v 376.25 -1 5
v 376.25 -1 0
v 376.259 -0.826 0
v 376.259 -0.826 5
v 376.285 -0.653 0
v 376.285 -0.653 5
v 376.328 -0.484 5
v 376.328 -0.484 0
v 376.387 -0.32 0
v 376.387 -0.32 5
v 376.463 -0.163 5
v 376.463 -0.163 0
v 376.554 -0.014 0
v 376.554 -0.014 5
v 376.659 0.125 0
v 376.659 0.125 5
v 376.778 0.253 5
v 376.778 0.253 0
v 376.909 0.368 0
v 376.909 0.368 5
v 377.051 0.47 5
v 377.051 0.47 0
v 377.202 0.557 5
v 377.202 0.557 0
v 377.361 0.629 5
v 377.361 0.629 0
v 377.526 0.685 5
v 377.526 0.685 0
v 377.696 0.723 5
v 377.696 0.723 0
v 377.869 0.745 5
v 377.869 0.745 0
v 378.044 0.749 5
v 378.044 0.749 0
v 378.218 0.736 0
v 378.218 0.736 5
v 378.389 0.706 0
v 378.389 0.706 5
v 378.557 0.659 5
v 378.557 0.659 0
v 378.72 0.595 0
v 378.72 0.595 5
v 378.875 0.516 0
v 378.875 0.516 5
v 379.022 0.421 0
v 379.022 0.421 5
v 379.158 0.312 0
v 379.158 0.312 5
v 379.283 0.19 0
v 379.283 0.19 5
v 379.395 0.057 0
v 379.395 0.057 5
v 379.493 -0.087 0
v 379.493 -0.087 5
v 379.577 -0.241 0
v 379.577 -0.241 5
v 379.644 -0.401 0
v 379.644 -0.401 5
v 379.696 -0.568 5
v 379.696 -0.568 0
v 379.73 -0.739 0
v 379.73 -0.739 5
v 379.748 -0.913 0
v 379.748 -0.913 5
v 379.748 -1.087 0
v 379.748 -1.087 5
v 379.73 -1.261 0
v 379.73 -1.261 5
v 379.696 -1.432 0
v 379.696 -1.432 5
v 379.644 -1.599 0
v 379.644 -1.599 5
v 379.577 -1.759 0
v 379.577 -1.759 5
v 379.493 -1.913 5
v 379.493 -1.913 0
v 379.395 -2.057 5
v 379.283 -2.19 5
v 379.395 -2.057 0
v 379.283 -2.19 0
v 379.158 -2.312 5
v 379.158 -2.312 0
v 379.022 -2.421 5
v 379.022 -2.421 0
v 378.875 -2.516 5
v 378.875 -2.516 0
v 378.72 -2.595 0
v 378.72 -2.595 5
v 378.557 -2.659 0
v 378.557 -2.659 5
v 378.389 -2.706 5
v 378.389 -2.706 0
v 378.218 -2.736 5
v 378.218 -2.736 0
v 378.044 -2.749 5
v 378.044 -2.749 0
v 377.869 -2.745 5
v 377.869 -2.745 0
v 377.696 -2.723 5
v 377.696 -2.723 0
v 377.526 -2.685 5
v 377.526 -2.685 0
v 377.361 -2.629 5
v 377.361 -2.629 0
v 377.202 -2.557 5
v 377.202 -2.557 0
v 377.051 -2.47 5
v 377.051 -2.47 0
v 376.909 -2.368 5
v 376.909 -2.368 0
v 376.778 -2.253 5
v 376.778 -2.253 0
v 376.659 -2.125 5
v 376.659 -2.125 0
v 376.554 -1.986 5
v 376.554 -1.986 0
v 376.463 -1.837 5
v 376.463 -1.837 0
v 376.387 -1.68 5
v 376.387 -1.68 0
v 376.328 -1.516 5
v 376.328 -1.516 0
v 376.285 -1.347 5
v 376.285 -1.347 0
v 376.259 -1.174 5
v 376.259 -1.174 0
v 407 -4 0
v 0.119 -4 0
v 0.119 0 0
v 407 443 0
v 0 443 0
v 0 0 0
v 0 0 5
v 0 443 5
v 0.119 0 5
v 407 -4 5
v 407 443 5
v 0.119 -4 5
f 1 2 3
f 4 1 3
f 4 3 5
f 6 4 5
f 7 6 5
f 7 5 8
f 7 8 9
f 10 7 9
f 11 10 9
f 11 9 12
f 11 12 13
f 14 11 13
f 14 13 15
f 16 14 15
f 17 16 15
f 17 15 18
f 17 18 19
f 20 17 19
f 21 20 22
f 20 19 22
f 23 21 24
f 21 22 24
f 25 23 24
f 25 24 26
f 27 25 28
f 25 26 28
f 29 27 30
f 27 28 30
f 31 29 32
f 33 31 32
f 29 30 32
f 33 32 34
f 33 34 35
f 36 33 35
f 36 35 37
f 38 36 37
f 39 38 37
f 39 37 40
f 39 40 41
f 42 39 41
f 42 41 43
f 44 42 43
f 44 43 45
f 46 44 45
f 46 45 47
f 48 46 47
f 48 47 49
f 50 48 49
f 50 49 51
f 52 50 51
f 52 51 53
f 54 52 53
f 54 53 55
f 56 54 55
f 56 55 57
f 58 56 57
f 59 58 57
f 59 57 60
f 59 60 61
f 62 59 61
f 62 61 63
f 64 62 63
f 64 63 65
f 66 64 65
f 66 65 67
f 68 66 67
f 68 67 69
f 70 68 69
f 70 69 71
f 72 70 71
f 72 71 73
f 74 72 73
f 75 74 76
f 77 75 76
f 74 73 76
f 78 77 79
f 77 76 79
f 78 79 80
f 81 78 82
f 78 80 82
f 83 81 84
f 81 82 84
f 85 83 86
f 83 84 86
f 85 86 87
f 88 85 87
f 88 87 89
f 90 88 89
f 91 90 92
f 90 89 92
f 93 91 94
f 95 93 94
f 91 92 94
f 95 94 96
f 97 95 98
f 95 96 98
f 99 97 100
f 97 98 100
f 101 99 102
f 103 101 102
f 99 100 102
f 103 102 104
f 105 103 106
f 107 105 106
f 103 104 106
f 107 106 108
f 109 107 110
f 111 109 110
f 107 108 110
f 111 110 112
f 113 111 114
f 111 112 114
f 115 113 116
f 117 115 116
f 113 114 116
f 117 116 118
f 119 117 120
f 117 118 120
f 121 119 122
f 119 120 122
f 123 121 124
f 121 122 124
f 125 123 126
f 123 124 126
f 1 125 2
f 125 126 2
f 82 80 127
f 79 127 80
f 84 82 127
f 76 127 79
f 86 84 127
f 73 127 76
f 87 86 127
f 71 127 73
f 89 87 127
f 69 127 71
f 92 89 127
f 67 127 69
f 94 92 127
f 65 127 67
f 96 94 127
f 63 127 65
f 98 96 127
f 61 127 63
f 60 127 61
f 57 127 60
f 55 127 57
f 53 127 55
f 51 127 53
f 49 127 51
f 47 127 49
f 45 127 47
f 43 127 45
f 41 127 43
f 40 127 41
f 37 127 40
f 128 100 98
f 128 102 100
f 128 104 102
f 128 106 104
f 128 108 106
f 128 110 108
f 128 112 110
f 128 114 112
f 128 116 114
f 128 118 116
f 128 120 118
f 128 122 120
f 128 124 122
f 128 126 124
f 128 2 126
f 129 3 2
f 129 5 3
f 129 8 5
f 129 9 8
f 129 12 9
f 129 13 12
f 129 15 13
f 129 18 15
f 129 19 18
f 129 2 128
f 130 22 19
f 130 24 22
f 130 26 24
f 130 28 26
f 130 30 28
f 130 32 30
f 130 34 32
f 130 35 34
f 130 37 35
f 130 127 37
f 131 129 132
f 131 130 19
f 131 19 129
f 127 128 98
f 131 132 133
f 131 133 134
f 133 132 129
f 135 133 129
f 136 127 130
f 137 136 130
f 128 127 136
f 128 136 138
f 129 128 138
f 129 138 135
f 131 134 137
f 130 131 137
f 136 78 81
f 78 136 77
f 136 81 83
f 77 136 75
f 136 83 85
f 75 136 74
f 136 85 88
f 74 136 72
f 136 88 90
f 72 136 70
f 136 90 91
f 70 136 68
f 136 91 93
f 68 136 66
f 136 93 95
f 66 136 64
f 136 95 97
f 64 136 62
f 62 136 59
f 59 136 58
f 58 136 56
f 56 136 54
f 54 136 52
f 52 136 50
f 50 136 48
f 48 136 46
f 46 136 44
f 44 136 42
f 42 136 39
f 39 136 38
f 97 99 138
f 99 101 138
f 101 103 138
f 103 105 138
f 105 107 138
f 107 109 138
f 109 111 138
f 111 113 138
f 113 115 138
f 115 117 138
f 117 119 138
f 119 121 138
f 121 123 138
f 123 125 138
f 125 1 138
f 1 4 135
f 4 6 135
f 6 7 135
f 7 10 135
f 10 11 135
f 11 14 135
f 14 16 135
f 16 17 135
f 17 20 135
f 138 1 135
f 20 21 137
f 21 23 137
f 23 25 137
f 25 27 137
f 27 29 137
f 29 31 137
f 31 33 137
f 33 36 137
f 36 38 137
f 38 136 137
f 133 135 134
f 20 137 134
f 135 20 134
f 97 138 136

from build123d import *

# Parameters (mm, degrees)
SKETCH1_W           = 407
SKETCH1_H           = 450
BOSS_EXTRUDE1_DEPTH = 5
SKETCH4_R           = 1.75
CUT_EXTRUDE3_DEPTH  = 6
SKETCH5_W           = 406.880604732
SKETCH5_H           = 4
BOSS_EXTRUDE2_DEPTH = 5
SKETCH6_R           = 1.75
CUT_EXTRUDE4_DEPTH  = 6
SKETCH7_W           = 407
SKETCH7_H           = 7
CUT_EXTRUDE5_DEPTH  = 10


with BuildPart() as part:
    # Sketch1 → Boss-Extrude1 (new body)
    with BuildSketch(Plane.XY):
        with Locations((203.5, 225)):
            Rectangle(SKETCH1_W, SKETCH1_H)
    extrude(amount=BOSS_EXTRUDE1_DEPTH)

    # Sketch4 → Cut-Extrude3 (cut, through all)
    with BuildSketch(Plane(origin=(0, 0, 0), x_dir=(-1, 0, 0), z_dir=(0, 0, -1))):
        with Locations((-378, 447)):
            Circle(SKETCH4_R)
    extrude(amount=-CUT_EXTRUDE3_DEPTH, mode=Mode.SUBTRACT)

    # Sketch5 → Boss-Extrude2 (add)
    with BuildSketch(Plane(origin=(0, 0, 0), x_dir=(-1, 0, 0), z_dir=(0, 0, -1))):
        with Locations((-203.559697634, -2)):
            Rectangle(SKETCH5_W, SKETCH5_H)
    extrude(amount=-BOSS_EXTRUDE2_DEPTH)

    # Sketch6 → Cut-Extrude4 (cut, through all)
    with BuildSketch(Plane(origin=(0, 0, 0), x_dir=(-1, 0, 0), z_dir=(0, 0, -1))):
        with Locations((-378, -1)):
            Circle(SKETCH6_R)
    extrude(amount=-CUT_EXTRUDE4_DEPTH, mode=Mode.SUBTRACT)

    # Sketch7 → Cut-Extrude5 (cut)
    with BuildSketch(Plane.XY.offset(5)):
        with Locations((203.5, 446.5)):
            Rectangle(SKETCH7_W, SKETCH7_H)
    extrude(amount=-CUT_EXTRUDE5_DEPTH, mode=Mode.SUBTRACT)


solid = part.part
